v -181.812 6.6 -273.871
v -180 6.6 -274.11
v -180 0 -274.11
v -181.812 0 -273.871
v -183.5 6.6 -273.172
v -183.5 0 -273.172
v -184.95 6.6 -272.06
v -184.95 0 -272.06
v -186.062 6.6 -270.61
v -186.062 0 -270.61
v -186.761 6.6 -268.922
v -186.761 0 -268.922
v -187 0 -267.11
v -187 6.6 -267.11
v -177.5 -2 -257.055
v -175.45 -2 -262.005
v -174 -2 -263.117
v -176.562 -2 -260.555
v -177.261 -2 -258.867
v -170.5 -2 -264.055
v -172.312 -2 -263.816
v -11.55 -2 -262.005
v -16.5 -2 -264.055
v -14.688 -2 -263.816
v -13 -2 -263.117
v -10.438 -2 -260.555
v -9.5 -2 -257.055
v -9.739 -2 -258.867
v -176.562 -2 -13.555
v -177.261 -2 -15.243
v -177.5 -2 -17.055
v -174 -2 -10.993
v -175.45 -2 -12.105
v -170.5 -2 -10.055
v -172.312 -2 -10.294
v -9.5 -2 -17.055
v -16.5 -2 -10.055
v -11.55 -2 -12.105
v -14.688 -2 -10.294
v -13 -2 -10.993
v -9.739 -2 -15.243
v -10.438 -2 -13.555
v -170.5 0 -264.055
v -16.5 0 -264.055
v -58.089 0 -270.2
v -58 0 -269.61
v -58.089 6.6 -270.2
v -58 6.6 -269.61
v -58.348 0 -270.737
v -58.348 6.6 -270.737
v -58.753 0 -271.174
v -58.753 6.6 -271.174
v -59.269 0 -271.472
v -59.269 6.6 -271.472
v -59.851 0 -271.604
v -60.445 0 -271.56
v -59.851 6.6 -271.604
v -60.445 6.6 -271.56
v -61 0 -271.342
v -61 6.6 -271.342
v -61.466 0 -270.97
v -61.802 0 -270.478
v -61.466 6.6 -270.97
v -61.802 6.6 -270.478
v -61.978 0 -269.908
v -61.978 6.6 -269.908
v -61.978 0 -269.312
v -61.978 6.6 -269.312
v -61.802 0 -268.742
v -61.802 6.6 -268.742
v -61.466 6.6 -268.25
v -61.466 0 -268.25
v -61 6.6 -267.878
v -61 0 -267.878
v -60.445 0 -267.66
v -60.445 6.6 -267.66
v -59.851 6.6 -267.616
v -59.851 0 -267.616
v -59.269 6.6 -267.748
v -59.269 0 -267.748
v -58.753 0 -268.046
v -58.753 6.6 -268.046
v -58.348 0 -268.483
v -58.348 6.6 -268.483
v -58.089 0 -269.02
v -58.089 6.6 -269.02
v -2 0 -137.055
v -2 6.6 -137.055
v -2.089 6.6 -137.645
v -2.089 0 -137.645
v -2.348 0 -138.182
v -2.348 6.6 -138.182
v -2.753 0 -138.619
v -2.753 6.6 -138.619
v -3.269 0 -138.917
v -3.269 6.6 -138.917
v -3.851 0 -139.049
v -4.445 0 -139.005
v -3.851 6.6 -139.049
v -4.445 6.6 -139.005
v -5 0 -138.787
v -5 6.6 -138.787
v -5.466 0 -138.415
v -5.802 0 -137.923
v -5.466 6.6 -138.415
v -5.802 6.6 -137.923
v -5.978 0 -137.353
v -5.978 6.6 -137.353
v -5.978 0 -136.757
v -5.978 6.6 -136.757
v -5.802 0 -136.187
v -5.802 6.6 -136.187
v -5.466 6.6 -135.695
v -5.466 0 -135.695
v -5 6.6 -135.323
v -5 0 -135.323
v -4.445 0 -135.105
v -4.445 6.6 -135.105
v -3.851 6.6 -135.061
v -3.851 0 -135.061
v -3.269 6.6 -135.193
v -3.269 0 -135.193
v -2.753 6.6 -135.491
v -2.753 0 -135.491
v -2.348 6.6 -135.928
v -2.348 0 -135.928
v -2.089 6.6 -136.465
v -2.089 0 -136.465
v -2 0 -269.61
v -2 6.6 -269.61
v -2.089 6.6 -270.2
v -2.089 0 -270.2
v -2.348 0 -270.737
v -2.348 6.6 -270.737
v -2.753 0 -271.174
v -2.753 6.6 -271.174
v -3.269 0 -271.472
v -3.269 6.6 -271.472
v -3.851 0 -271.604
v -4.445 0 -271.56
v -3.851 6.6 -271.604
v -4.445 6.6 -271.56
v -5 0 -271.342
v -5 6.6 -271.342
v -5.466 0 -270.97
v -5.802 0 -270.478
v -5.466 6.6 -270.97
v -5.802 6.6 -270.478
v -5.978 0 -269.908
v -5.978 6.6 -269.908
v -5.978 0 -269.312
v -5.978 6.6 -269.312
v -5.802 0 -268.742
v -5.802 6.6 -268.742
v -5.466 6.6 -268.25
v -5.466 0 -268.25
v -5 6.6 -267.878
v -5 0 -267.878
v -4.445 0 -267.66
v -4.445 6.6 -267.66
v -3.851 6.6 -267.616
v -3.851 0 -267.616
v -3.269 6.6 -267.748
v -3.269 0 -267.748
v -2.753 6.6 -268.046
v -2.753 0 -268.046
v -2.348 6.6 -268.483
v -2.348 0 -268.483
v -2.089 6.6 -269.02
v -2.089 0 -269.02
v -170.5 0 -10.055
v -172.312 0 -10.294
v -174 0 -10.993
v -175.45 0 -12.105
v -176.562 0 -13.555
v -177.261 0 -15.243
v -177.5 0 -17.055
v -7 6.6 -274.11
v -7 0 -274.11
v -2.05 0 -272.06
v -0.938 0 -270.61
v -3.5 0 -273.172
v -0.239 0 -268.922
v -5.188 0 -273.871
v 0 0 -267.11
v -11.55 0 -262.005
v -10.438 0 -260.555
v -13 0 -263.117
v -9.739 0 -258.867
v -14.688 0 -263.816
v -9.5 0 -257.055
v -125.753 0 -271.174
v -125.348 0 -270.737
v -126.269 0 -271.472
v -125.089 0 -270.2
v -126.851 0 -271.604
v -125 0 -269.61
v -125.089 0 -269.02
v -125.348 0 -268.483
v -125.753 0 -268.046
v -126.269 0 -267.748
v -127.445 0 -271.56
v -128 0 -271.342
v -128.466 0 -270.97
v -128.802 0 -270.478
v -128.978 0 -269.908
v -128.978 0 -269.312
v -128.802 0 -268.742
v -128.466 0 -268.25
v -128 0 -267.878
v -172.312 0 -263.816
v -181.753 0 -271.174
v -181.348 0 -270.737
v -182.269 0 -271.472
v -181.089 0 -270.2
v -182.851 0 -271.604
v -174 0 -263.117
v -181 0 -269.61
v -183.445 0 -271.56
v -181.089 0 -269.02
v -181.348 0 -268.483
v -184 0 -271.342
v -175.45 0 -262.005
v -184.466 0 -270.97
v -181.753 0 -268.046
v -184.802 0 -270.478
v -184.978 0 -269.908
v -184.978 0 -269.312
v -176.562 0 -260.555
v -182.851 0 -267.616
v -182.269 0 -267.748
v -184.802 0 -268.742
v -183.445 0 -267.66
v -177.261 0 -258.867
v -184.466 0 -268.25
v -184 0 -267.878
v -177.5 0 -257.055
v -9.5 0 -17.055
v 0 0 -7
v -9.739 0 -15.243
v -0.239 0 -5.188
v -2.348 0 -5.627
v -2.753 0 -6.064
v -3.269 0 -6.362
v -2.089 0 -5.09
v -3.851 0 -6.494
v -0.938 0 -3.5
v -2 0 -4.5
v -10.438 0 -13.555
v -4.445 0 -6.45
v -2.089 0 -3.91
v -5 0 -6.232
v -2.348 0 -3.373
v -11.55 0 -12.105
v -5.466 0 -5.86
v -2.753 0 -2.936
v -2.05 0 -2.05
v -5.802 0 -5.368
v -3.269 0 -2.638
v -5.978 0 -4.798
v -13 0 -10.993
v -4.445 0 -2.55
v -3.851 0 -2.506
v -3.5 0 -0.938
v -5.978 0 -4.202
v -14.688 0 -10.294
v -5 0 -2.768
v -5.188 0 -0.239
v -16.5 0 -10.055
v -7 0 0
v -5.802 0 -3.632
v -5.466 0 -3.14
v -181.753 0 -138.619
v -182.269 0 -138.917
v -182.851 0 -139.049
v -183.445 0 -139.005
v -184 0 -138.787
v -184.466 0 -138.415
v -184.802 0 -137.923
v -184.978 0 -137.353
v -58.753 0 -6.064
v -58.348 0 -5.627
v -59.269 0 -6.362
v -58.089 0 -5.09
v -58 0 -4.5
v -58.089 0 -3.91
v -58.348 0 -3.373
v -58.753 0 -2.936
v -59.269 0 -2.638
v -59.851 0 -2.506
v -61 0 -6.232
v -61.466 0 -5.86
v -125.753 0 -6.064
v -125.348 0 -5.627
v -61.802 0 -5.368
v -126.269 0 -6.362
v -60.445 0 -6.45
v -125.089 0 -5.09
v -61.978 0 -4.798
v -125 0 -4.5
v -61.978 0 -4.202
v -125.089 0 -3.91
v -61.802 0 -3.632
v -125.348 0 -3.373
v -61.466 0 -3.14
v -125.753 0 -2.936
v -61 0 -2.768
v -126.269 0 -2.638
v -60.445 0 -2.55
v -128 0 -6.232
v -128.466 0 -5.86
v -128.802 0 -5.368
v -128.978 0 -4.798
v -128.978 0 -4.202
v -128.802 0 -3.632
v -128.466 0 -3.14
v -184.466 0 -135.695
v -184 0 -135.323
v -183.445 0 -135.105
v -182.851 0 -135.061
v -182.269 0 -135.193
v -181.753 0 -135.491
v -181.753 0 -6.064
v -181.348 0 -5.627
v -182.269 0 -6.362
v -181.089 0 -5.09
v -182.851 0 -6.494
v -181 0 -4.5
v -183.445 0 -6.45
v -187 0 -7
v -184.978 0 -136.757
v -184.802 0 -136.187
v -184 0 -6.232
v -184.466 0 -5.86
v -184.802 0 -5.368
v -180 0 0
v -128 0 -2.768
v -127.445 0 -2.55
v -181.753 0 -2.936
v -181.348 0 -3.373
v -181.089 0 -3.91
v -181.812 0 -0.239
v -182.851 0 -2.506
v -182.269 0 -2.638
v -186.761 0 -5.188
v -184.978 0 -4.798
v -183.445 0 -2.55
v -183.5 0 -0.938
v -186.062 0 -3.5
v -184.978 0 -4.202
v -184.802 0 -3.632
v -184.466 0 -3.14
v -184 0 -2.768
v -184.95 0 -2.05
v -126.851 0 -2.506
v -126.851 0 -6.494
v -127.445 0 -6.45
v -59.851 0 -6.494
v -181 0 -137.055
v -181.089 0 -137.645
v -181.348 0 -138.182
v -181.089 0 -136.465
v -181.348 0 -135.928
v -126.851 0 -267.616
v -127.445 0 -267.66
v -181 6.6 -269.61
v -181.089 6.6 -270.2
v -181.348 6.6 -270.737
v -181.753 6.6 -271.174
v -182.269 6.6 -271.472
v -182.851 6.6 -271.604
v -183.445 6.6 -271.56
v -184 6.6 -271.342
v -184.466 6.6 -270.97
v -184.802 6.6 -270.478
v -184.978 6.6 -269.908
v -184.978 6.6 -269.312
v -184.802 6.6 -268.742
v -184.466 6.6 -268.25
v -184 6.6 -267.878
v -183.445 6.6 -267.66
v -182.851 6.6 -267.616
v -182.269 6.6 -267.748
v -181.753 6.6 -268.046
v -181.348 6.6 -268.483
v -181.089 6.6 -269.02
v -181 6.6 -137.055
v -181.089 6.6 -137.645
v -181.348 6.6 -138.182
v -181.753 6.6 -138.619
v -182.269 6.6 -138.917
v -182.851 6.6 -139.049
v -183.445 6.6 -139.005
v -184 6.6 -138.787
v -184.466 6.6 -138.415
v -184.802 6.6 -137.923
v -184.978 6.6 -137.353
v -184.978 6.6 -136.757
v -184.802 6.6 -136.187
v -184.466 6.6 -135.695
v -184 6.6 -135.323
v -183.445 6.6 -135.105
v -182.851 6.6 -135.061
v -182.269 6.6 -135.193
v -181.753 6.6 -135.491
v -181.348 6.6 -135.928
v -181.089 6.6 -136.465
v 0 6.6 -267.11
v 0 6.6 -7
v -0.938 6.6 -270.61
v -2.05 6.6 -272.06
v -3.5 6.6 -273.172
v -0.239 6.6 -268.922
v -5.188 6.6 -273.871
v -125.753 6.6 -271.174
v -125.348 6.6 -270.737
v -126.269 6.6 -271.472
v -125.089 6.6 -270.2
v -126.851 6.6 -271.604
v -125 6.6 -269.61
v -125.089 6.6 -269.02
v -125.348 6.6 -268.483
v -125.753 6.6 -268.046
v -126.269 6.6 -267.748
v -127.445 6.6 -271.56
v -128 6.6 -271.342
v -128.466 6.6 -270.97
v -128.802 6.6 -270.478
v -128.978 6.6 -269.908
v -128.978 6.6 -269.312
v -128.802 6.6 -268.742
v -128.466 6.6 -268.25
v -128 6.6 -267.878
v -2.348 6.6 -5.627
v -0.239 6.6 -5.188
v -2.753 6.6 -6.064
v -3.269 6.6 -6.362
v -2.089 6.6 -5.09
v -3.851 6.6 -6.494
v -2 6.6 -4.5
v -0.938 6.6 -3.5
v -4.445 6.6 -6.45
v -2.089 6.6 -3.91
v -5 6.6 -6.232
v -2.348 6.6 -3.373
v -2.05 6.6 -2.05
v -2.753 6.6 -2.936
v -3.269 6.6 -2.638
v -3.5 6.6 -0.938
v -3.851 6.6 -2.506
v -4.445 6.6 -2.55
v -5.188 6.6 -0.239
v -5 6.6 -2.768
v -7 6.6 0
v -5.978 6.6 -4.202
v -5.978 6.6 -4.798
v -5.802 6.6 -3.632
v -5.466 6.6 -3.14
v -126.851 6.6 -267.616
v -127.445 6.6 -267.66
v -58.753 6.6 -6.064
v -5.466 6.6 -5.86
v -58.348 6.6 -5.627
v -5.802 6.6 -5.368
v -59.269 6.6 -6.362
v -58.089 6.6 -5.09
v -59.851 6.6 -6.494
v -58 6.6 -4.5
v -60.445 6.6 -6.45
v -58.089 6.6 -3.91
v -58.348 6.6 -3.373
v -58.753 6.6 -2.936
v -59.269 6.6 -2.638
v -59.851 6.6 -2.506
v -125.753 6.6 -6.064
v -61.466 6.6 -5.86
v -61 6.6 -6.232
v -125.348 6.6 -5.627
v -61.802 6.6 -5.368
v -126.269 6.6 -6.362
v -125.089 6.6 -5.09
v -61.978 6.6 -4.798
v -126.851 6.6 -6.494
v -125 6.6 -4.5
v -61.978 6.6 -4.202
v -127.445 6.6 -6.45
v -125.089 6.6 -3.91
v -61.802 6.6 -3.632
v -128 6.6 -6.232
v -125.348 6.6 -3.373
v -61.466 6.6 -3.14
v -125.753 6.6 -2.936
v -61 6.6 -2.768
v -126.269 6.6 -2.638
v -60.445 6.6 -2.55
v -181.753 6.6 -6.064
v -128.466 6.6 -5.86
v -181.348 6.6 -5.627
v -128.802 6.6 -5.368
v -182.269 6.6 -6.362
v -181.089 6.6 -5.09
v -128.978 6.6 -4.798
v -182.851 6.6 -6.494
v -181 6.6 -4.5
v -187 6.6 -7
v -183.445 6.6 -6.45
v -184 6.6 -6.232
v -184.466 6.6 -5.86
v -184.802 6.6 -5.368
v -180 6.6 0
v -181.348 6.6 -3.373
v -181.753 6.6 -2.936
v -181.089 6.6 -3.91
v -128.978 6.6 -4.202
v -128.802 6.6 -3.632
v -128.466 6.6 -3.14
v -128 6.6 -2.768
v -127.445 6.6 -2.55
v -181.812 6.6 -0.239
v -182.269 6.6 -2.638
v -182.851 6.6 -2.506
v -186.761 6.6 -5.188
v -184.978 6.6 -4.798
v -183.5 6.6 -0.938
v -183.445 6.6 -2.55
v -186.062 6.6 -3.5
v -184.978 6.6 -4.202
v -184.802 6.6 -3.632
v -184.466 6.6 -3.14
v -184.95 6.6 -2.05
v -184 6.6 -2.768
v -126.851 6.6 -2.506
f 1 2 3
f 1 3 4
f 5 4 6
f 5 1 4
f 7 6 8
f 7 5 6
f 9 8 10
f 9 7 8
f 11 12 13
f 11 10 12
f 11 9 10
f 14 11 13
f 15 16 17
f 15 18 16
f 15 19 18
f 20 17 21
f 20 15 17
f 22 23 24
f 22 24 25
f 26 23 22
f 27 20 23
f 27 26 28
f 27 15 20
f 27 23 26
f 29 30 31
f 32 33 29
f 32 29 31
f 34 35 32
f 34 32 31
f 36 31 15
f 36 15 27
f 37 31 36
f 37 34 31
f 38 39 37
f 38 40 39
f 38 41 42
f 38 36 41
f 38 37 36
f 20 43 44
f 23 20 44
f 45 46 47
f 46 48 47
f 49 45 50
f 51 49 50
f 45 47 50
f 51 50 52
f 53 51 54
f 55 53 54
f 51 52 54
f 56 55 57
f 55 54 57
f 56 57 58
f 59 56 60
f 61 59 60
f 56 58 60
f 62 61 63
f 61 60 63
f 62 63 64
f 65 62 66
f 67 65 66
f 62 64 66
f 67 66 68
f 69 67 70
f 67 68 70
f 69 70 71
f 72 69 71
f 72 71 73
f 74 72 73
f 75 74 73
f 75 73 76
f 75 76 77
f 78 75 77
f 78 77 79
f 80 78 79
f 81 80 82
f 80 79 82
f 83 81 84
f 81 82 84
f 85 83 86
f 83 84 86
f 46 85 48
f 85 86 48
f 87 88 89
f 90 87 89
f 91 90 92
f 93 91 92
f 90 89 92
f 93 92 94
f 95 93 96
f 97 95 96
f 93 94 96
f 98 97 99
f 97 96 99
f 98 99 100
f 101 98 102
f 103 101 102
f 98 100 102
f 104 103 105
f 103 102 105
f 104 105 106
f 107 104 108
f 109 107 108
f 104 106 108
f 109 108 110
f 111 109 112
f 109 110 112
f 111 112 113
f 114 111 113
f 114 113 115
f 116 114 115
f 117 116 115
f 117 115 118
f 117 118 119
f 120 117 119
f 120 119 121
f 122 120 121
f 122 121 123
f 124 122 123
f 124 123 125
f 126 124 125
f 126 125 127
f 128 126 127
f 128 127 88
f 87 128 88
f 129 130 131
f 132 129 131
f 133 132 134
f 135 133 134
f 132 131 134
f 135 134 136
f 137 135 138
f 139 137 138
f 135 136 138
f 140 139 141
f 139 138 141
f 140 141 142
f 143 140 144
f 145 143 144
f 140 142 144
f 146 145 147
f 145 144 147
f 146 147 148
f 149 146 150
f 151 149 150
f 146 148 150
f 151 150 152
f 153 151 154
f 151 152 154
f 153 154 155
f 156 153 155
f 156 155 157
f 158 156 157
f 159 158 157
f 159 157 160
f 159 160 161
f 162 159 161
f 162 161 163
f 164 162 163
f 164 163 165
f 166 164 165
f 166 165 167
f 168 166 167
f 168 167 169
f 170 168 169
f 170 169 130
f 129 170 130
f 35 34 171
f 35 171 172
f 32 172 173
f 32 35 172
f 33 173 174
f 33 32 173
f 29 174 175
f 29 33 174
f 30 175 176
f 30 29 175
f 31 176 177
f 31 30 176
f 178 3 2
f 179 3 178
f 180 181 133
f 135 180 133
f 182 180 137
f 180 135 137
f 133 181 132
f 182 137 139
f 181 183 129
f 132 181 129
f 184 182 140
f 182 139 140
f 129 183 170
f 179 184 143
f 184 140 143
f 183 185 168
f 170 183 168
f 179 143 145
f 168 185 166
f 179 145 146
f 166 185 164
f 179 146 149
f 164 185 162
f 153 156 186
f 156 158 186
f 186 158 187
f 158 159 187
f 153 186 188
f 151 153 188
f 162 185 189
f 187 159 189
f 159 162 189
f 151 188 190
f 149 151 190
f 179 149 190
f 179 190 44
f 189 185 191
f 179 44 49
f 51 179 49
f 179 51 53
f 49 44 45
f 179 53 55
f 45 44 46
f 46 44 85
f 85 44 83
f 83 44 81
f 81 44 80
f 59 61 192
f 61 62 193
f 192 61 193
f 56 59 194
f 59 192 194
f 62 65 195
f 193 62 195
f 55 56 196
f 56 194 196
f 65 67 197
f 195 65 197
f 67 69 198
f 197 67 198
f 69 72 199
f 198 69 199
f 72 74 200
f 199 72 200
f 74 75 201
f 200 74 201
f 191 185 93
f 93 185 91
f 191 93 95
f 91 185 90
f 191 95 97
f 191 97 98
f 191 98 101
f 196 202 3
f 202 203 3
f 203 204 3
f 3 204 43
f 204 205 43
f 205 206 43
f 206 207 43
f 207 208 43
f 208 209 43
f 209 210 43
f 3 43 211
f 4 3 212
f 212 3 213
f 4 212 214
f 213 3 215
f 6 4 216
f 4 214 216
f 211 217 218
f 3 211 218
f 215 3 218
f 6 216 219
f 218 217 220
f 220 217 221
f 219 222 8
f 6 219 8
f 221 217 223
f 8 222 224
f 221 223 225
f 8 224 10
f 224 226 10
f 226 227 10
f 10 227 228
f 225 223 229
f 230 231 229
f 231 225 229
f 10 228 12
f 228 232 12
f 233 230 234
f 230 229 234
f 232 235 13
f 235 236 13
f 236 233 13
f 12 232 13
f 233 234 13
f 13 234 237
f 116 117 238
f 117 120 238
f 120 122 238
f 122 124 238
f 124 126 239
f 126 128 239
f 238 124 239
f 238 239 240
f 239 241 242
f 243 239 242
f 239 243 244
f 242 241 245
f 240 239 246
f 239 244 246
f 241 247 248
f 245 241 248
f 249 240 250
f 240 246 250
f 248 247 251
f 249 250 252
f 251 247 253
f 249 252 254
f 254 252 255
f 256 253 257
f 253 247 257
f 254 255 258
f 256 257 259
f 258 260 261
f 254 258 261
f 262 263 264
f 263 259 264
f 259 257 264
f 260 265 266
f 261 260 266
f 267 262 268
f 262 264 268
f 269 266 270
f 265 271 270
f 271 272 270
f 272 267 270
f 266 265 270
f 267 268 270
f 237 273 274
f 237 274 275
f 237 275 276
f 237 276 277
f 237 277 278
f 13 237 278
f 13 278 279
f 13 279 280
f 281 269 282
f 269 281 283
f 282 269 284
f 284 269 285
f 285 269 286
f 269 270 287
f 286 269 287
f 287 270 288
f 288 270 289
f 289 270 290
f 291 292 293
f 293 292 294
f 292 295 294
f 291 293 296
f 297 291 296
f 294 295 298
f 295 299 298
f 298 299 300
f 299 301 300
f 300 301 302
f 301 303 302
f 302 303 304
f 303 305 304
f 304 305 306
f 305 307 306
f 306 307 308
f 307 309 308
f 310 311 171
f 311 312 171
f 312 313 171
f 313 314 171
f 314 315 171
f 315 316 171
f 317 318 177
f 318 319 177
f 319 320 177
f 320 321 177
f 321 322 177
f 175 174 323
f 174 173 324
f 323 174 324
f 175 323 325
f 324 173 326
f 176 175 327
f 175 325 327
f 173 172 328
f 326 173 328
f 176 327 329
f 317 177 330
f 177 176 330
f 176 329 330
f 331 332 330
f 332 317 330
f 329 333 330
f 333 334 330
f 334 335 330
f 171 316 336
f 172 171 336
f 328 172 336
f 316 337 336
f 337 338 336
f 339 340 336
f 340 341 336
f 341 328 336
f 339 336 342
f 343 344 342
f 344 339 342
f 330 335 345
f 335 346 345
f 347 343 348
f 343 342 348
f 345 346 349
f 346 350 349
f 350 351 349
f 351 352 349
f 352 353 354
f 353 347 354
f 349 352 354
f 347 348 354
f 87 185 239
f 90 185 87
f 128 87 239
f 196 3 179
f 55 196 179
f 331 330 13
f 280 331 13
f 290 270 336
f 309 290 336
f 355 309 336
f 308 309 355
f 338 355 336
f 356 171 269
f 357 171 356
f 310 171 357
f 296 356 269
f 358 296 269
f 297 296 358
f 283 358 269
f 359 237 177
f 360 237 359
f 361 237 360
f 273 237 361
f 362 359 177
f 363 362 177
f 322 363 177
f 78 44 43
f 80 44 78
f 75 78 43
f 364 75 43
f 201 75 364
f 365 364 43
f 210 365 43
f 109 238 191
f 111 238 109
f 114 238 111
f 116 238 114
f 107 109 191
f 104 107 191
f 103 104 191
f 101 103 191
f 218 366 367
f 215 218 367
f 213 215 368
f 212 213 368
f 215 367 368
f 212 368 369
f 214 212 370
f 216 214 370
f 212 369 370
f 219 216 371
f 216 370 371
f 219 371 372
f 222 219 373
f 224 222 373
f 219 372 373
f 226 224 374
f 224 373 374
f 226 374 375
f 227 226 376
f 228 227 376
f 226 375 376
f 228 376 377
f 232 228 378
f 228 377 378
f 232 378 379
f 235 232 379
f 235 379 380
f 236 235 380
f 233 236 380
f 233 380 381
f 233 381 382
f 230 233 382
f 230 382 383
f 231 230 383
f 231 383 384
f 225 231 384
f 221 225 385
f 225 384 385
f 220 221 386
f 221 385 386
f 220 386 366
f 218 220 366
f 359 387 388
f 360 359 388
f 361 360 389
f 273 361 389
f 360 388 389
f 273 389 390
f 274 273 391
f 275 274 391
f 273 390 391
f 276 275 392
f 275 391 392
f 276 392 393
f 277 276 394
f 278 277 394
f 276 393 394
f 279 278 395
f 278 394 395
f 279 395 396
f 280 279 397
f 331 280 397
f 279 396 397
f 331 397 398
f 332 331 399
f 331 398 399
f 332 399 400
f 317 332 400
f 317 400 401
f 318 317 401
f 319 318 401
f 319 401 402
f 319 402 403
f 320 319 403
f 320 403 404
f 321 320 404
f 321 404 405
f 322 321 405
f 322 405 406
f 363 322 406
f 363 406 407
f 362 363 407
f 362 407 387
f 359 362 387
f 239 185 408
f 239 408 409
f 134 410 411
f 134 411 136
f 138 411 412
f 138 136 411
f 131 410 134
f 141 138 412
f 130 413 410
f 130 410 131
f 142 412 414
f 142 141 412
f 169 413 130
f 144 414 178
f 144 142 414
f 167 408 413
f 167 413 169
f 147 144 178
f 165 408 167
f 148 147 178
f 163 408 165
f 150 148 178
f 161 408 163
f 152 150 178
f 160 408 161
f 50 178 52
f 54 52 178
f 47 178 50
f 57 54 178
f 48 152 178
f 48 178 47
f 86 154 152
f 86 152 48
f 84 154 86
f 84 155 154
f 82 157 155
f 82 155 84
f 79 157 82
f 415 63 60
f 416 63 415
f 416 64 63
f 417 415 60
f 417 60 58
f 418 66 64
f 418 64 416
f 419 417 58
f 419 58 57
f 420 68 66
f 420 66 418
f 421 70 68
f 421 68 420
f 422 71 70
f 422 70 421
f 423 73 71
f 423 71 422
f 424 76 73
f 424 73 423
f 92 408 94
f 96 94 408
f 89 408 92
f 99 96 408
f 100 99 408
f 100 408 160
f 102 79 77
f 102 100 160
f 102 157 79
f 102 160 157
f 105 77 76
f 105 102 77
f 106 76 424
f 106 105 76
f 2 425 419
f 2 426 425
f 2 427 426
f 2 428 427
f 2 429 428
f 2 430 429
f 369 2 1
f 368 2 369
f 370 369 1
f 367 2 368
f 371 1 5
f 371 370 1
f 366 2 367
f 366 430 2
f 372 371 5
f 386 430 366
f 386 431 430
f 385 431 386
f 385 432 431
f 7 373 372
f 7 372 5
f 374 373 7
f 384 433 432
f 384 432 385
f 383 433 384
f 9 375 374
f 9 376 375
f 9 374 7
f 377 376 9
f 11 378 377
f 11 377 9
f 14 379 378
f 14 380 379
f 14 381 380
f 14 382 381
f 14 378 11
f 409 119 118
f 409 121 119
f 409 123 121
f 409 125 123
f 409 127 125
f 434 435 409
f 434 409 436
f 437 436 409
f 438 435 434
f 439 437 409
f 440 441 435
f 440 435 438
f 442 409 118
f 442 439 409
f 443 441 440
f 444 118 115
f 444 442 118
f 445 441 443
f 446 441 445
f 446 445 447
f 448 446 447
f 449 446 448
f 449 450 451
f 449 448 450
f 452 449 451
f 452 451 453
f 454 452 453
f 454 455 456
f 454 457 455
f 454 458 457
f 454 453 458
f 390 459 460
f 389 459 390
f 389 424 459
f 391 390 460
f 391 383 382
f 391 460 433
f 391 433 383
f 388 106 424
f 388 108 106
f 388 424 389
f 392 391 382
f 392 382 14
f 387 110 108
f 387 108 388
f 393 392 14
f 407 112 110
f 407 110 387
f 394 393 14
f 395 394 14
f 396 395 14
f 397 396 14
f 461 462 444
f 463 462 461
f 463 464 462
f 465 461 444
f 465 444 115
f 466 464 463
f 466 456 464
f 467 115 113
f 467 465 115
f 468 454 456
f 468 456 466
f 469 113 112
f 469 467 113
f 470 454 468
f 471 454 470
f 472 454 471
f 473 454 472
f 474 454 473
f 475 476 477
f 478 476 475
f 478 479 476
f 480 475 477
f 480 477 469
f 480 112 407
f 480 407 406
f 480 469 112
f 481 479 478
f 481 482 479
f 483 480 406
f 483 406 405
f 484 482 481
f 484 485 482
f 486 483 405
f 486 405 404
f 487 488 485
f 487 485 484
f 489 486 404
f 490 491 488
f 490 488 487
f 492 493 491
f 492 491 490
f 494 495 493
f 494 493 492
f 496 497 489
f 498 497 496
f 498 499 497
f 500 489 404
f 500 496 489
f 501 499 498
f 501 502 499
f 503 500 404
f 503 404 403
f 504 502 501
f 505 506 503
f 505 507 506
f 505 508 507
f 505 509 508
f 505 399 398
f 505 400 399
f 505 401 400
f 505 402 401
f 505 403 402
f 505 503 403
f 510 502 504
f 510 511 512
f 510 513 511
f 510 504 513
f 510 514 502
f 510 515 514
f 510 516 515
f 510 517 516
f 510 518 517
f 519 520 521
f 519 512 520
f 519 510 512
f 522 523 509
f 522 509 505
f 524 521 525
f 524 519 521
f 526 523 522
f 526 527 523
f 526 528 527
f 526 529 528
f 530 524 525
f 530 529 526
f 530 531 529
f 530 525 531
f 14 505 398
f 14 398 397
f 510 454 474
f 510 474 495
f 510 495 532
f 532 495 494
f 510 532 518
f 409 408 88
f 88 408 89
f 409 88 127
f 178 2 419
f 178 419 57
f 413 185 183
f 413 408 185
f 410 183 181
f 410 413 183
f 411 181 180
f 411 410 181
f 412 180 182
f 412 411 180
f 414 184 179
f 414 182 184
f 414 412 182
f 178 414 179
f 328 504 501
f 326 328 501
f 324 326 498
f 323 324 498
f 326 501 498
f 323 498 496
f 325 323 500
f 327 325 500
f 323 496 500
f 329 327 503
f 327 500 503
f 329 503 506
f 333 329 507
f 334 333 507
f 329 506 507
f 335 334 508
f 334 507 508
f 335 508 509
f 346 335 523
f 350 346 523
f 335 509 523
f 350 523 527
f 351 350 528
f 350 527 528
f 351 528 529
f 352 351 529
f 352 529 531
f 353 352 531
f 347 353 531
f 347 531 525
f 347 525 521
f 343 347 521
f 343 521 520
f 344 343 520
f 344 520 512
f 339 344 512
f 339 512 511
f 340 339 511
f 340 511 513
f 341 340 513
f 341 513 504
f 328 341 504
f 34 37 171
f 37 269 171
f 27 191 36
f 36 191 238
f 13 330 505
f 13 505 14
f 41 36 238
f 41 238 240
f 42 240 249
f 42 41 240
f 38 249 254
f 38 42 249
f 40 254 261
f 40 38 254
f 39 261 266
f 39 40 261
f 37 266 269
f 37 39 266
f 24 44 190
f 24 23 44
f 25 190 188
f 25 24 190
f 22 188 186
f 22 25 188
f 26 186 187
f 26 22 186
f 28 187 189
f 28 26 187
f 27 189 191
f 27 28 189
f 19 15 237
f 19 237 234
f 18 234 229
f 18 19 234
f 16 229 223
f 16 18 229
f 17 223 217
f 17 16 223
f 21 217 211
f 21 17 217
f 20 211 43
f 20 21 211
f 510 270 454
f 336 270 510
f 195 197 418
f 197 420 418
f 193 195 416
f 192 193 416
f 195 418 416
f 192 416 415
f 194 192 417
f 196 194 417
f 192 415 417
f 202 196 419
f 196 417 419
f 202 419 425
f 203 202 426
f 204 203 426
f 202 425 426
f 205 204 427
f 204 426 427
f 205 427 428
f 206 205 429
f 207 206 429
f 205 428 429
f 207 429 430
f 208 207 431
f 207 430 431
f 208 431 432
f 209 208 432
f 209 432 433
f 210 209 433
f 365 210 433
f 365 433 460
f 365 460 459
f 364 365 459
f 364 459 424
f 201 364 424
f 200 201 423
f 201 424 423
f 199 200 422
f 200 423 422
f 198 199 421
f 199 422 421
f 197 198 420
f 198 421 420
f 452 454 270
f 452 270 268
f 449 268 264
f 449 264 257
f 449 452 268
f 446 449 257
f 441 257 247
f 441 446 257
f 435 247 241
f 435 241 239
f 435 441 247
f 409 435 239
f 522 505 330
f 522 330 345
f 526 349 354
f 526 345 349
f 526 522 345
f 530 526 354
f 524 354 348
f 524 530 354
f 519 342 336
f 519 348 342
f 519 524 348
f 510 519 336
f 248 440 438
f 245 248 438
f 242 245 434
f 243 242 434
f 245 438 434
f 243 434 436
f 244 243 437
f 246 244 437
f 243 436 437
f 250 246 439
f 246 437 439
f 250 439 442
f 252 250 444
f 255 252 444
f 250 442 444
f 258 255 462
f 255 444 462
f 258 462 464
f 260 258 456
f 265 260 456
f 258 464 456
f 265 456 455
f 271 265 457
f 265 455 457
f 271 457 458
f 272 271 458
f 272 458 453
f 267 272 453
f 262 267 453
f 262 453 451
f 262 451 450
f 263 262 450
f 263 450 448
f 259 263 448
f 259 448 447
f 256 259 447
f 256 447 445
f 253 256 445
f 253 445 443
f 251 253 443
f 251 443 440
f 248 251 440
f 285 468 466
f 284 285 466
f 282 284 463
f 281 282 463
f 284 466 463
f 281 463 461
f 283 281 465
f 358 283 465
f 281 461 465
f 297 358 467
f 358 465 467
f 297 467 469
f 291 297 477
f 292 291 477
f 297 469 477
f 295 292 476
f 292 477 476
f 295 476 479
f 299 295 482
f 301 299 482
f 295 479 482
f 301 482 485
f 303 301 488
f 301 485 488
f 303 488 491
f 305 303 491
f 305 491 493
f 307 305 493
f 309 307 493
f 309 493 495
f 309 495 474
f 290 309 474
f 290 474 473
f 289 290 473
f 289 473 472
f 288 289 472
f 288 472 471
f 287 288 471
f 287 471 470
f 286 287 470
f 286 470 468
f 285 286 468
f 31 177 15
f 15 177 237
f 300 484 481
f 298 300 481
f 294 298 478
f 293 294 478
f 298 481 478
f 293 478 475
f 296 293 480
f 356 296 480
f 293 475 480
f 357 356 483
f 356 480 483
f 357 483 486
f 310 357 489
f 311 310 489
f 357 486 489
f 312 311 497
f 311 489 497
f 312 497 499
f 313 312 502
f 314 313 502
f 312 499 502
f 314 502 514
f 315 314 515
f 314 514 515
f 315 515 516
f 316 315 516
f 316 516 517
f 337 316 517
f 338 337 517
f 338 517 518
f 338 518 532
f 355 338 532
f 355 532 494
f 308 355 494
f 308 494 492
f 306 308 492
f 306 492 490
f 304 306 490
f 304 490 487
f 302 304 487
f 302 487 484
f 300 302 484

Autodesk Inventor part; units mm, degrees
ref_plane "YZ Plane" through (0, 0, 0) normal (1, 0, 0) x (0, 1, 0)
ref_plane "XZ Plane" through (0, 0, 0) normal (0, 1, 0) x (-1, 0, 0)
ref_plane "XY Plane" through (0, 0, 0) normal (0, 0, 1) x (1, 0, 0)
sketch "Sketch1" plane through (0, 0, 0) normal (0, 1, 0) x (-1, 0, 0)
  line L0 (0, 0) -> (187, 0)
  line L1 (187, 0) -> (187, -274.11)
  line L2 (187, -274.11) -> (0, -274.11)
  line L3 (0, -274.11) -> (0, 0)
  dimension "d0" = 187
  dimension "d1" = 274.11
extrude "Extrusion1" add sketch "Sketch1" along normal blind 6.6
fillet "Fillet1" radius 7 4 edges at (0, 3.3, 0) (-187, 3.3, 0) (-187, 3.3, -274.11) (0, 3.3, -274.11)
sketch "Sketch2" plane through (0, 0, 0) normal (0, -1, 0) x (1, 0, 0)
  line L0 (-9.5, -10.055) -> (-177.5, -10.055)
  line L1 (-177.5, -10.055) -> (-177.5, -264.055)
  line L2 (-177.5, -264.055) -> (-9.5, -264.055)
  line L3 (-9.5, -264.055) -> (-9.5, -10.055)
  arc A0 (-7, -274.11) -> (0, -267.11) centre (-7, -267.11) ccw projected
  line L4 (0, -7) -> (0, -267.11) projected
  arc A1 (0, -7) -> (-7, 0) centre (-7, -7) ccw projected
  line L5 (-180, 0) -> (-7, 0) projected
  arc A2 (-180, 0) -> (-187, -7) centre (-180, -7) ccw projected
  line L6 (-187, -267.11) -> (-187, -7) projected
  arc A3 (-187, -267.11) -> (-180, -274.11) centre (-180, -267.11) ccw projected
  line L7 (-7, -274.11) -> (-180, -274.11) projected
  line L8 (-7, -7) -> (-180, -267.11) construction
  line L9 (-177.5, -10.055) -> (-9.5, -264.055) construction
  point P0 (0, 0)
  point P1 (-93.5, -137.055)
  dimension "d5" = 254
  dimension "d6" = 168
extrude "Extrusion2" add sketch "Sketch2" along normal blind 2 contours L3 L2 L1 L0
fillet "Fillet2" radius 7 4 edges at (-9.5, -1, -264.055) (-177.5, -1, -264.055) (-177.5, -1, -10.055) (-9.5, -1, -10.055)
sketch "Sketch3" plane through (0, 6.6, 0) normal (0, 1, 0) x (1, 0, 0)
  line L0 (0, 7) -> (0, 267.11) projected
  line L1 (0, 137.055) -> (-187, 137.055) construction
  line L2 (-187, 267.11) -> (-187, 7) projected
  line L3 (-7, 274.11) -> (-180, 274.11) projected
  line L4 (-93.5, 274.11) -> (-93.5, 0) construction
  line L5 (-180, 0) -> (-7, 0) projected
  circle A0 centre (-4, 137.055) radius 2
  circle A1 centre (-4, 4.5) radius 2
  circle A2 centre (-60, 4.5) radius 2
  circle A3 centre (-4, 269.61) radius 2
  line L6 (-4, 269.61) -> (-183, 269.61) construction
  line L7 (-183, 269.61) -> (-183, 4.5) construction
  line L8 (-183, 4.5) -> (-4, 4.5) construction
  line L9 (-4, 4.5) -> (-4, 269.61) construction
  circle A4 centre (-60, 269.61) radius 2
  circle A5 centre (-183, 137.055) radius 2
  circle A6 centre (-183, 4.5) radius 2
  circle A7 centre (-127, 4.5) radius 2
  circle A8 centre (-183, 269.61) radius 2
  circle A9 centre (-127, 269.61) radius 2
  point P0 (0, 0)
  dimension "d9" = 4
  dimension "d10" = 4
  dimension "d11" = 4
  dimension "d18" = 265.11
  dimension "d19" = 179
  dimension "d20" = 67
extrude "Extrusion4" cut sketch "Sketch3" against normal up to surface (6.6 mm away)
properties part number "screen_case"
